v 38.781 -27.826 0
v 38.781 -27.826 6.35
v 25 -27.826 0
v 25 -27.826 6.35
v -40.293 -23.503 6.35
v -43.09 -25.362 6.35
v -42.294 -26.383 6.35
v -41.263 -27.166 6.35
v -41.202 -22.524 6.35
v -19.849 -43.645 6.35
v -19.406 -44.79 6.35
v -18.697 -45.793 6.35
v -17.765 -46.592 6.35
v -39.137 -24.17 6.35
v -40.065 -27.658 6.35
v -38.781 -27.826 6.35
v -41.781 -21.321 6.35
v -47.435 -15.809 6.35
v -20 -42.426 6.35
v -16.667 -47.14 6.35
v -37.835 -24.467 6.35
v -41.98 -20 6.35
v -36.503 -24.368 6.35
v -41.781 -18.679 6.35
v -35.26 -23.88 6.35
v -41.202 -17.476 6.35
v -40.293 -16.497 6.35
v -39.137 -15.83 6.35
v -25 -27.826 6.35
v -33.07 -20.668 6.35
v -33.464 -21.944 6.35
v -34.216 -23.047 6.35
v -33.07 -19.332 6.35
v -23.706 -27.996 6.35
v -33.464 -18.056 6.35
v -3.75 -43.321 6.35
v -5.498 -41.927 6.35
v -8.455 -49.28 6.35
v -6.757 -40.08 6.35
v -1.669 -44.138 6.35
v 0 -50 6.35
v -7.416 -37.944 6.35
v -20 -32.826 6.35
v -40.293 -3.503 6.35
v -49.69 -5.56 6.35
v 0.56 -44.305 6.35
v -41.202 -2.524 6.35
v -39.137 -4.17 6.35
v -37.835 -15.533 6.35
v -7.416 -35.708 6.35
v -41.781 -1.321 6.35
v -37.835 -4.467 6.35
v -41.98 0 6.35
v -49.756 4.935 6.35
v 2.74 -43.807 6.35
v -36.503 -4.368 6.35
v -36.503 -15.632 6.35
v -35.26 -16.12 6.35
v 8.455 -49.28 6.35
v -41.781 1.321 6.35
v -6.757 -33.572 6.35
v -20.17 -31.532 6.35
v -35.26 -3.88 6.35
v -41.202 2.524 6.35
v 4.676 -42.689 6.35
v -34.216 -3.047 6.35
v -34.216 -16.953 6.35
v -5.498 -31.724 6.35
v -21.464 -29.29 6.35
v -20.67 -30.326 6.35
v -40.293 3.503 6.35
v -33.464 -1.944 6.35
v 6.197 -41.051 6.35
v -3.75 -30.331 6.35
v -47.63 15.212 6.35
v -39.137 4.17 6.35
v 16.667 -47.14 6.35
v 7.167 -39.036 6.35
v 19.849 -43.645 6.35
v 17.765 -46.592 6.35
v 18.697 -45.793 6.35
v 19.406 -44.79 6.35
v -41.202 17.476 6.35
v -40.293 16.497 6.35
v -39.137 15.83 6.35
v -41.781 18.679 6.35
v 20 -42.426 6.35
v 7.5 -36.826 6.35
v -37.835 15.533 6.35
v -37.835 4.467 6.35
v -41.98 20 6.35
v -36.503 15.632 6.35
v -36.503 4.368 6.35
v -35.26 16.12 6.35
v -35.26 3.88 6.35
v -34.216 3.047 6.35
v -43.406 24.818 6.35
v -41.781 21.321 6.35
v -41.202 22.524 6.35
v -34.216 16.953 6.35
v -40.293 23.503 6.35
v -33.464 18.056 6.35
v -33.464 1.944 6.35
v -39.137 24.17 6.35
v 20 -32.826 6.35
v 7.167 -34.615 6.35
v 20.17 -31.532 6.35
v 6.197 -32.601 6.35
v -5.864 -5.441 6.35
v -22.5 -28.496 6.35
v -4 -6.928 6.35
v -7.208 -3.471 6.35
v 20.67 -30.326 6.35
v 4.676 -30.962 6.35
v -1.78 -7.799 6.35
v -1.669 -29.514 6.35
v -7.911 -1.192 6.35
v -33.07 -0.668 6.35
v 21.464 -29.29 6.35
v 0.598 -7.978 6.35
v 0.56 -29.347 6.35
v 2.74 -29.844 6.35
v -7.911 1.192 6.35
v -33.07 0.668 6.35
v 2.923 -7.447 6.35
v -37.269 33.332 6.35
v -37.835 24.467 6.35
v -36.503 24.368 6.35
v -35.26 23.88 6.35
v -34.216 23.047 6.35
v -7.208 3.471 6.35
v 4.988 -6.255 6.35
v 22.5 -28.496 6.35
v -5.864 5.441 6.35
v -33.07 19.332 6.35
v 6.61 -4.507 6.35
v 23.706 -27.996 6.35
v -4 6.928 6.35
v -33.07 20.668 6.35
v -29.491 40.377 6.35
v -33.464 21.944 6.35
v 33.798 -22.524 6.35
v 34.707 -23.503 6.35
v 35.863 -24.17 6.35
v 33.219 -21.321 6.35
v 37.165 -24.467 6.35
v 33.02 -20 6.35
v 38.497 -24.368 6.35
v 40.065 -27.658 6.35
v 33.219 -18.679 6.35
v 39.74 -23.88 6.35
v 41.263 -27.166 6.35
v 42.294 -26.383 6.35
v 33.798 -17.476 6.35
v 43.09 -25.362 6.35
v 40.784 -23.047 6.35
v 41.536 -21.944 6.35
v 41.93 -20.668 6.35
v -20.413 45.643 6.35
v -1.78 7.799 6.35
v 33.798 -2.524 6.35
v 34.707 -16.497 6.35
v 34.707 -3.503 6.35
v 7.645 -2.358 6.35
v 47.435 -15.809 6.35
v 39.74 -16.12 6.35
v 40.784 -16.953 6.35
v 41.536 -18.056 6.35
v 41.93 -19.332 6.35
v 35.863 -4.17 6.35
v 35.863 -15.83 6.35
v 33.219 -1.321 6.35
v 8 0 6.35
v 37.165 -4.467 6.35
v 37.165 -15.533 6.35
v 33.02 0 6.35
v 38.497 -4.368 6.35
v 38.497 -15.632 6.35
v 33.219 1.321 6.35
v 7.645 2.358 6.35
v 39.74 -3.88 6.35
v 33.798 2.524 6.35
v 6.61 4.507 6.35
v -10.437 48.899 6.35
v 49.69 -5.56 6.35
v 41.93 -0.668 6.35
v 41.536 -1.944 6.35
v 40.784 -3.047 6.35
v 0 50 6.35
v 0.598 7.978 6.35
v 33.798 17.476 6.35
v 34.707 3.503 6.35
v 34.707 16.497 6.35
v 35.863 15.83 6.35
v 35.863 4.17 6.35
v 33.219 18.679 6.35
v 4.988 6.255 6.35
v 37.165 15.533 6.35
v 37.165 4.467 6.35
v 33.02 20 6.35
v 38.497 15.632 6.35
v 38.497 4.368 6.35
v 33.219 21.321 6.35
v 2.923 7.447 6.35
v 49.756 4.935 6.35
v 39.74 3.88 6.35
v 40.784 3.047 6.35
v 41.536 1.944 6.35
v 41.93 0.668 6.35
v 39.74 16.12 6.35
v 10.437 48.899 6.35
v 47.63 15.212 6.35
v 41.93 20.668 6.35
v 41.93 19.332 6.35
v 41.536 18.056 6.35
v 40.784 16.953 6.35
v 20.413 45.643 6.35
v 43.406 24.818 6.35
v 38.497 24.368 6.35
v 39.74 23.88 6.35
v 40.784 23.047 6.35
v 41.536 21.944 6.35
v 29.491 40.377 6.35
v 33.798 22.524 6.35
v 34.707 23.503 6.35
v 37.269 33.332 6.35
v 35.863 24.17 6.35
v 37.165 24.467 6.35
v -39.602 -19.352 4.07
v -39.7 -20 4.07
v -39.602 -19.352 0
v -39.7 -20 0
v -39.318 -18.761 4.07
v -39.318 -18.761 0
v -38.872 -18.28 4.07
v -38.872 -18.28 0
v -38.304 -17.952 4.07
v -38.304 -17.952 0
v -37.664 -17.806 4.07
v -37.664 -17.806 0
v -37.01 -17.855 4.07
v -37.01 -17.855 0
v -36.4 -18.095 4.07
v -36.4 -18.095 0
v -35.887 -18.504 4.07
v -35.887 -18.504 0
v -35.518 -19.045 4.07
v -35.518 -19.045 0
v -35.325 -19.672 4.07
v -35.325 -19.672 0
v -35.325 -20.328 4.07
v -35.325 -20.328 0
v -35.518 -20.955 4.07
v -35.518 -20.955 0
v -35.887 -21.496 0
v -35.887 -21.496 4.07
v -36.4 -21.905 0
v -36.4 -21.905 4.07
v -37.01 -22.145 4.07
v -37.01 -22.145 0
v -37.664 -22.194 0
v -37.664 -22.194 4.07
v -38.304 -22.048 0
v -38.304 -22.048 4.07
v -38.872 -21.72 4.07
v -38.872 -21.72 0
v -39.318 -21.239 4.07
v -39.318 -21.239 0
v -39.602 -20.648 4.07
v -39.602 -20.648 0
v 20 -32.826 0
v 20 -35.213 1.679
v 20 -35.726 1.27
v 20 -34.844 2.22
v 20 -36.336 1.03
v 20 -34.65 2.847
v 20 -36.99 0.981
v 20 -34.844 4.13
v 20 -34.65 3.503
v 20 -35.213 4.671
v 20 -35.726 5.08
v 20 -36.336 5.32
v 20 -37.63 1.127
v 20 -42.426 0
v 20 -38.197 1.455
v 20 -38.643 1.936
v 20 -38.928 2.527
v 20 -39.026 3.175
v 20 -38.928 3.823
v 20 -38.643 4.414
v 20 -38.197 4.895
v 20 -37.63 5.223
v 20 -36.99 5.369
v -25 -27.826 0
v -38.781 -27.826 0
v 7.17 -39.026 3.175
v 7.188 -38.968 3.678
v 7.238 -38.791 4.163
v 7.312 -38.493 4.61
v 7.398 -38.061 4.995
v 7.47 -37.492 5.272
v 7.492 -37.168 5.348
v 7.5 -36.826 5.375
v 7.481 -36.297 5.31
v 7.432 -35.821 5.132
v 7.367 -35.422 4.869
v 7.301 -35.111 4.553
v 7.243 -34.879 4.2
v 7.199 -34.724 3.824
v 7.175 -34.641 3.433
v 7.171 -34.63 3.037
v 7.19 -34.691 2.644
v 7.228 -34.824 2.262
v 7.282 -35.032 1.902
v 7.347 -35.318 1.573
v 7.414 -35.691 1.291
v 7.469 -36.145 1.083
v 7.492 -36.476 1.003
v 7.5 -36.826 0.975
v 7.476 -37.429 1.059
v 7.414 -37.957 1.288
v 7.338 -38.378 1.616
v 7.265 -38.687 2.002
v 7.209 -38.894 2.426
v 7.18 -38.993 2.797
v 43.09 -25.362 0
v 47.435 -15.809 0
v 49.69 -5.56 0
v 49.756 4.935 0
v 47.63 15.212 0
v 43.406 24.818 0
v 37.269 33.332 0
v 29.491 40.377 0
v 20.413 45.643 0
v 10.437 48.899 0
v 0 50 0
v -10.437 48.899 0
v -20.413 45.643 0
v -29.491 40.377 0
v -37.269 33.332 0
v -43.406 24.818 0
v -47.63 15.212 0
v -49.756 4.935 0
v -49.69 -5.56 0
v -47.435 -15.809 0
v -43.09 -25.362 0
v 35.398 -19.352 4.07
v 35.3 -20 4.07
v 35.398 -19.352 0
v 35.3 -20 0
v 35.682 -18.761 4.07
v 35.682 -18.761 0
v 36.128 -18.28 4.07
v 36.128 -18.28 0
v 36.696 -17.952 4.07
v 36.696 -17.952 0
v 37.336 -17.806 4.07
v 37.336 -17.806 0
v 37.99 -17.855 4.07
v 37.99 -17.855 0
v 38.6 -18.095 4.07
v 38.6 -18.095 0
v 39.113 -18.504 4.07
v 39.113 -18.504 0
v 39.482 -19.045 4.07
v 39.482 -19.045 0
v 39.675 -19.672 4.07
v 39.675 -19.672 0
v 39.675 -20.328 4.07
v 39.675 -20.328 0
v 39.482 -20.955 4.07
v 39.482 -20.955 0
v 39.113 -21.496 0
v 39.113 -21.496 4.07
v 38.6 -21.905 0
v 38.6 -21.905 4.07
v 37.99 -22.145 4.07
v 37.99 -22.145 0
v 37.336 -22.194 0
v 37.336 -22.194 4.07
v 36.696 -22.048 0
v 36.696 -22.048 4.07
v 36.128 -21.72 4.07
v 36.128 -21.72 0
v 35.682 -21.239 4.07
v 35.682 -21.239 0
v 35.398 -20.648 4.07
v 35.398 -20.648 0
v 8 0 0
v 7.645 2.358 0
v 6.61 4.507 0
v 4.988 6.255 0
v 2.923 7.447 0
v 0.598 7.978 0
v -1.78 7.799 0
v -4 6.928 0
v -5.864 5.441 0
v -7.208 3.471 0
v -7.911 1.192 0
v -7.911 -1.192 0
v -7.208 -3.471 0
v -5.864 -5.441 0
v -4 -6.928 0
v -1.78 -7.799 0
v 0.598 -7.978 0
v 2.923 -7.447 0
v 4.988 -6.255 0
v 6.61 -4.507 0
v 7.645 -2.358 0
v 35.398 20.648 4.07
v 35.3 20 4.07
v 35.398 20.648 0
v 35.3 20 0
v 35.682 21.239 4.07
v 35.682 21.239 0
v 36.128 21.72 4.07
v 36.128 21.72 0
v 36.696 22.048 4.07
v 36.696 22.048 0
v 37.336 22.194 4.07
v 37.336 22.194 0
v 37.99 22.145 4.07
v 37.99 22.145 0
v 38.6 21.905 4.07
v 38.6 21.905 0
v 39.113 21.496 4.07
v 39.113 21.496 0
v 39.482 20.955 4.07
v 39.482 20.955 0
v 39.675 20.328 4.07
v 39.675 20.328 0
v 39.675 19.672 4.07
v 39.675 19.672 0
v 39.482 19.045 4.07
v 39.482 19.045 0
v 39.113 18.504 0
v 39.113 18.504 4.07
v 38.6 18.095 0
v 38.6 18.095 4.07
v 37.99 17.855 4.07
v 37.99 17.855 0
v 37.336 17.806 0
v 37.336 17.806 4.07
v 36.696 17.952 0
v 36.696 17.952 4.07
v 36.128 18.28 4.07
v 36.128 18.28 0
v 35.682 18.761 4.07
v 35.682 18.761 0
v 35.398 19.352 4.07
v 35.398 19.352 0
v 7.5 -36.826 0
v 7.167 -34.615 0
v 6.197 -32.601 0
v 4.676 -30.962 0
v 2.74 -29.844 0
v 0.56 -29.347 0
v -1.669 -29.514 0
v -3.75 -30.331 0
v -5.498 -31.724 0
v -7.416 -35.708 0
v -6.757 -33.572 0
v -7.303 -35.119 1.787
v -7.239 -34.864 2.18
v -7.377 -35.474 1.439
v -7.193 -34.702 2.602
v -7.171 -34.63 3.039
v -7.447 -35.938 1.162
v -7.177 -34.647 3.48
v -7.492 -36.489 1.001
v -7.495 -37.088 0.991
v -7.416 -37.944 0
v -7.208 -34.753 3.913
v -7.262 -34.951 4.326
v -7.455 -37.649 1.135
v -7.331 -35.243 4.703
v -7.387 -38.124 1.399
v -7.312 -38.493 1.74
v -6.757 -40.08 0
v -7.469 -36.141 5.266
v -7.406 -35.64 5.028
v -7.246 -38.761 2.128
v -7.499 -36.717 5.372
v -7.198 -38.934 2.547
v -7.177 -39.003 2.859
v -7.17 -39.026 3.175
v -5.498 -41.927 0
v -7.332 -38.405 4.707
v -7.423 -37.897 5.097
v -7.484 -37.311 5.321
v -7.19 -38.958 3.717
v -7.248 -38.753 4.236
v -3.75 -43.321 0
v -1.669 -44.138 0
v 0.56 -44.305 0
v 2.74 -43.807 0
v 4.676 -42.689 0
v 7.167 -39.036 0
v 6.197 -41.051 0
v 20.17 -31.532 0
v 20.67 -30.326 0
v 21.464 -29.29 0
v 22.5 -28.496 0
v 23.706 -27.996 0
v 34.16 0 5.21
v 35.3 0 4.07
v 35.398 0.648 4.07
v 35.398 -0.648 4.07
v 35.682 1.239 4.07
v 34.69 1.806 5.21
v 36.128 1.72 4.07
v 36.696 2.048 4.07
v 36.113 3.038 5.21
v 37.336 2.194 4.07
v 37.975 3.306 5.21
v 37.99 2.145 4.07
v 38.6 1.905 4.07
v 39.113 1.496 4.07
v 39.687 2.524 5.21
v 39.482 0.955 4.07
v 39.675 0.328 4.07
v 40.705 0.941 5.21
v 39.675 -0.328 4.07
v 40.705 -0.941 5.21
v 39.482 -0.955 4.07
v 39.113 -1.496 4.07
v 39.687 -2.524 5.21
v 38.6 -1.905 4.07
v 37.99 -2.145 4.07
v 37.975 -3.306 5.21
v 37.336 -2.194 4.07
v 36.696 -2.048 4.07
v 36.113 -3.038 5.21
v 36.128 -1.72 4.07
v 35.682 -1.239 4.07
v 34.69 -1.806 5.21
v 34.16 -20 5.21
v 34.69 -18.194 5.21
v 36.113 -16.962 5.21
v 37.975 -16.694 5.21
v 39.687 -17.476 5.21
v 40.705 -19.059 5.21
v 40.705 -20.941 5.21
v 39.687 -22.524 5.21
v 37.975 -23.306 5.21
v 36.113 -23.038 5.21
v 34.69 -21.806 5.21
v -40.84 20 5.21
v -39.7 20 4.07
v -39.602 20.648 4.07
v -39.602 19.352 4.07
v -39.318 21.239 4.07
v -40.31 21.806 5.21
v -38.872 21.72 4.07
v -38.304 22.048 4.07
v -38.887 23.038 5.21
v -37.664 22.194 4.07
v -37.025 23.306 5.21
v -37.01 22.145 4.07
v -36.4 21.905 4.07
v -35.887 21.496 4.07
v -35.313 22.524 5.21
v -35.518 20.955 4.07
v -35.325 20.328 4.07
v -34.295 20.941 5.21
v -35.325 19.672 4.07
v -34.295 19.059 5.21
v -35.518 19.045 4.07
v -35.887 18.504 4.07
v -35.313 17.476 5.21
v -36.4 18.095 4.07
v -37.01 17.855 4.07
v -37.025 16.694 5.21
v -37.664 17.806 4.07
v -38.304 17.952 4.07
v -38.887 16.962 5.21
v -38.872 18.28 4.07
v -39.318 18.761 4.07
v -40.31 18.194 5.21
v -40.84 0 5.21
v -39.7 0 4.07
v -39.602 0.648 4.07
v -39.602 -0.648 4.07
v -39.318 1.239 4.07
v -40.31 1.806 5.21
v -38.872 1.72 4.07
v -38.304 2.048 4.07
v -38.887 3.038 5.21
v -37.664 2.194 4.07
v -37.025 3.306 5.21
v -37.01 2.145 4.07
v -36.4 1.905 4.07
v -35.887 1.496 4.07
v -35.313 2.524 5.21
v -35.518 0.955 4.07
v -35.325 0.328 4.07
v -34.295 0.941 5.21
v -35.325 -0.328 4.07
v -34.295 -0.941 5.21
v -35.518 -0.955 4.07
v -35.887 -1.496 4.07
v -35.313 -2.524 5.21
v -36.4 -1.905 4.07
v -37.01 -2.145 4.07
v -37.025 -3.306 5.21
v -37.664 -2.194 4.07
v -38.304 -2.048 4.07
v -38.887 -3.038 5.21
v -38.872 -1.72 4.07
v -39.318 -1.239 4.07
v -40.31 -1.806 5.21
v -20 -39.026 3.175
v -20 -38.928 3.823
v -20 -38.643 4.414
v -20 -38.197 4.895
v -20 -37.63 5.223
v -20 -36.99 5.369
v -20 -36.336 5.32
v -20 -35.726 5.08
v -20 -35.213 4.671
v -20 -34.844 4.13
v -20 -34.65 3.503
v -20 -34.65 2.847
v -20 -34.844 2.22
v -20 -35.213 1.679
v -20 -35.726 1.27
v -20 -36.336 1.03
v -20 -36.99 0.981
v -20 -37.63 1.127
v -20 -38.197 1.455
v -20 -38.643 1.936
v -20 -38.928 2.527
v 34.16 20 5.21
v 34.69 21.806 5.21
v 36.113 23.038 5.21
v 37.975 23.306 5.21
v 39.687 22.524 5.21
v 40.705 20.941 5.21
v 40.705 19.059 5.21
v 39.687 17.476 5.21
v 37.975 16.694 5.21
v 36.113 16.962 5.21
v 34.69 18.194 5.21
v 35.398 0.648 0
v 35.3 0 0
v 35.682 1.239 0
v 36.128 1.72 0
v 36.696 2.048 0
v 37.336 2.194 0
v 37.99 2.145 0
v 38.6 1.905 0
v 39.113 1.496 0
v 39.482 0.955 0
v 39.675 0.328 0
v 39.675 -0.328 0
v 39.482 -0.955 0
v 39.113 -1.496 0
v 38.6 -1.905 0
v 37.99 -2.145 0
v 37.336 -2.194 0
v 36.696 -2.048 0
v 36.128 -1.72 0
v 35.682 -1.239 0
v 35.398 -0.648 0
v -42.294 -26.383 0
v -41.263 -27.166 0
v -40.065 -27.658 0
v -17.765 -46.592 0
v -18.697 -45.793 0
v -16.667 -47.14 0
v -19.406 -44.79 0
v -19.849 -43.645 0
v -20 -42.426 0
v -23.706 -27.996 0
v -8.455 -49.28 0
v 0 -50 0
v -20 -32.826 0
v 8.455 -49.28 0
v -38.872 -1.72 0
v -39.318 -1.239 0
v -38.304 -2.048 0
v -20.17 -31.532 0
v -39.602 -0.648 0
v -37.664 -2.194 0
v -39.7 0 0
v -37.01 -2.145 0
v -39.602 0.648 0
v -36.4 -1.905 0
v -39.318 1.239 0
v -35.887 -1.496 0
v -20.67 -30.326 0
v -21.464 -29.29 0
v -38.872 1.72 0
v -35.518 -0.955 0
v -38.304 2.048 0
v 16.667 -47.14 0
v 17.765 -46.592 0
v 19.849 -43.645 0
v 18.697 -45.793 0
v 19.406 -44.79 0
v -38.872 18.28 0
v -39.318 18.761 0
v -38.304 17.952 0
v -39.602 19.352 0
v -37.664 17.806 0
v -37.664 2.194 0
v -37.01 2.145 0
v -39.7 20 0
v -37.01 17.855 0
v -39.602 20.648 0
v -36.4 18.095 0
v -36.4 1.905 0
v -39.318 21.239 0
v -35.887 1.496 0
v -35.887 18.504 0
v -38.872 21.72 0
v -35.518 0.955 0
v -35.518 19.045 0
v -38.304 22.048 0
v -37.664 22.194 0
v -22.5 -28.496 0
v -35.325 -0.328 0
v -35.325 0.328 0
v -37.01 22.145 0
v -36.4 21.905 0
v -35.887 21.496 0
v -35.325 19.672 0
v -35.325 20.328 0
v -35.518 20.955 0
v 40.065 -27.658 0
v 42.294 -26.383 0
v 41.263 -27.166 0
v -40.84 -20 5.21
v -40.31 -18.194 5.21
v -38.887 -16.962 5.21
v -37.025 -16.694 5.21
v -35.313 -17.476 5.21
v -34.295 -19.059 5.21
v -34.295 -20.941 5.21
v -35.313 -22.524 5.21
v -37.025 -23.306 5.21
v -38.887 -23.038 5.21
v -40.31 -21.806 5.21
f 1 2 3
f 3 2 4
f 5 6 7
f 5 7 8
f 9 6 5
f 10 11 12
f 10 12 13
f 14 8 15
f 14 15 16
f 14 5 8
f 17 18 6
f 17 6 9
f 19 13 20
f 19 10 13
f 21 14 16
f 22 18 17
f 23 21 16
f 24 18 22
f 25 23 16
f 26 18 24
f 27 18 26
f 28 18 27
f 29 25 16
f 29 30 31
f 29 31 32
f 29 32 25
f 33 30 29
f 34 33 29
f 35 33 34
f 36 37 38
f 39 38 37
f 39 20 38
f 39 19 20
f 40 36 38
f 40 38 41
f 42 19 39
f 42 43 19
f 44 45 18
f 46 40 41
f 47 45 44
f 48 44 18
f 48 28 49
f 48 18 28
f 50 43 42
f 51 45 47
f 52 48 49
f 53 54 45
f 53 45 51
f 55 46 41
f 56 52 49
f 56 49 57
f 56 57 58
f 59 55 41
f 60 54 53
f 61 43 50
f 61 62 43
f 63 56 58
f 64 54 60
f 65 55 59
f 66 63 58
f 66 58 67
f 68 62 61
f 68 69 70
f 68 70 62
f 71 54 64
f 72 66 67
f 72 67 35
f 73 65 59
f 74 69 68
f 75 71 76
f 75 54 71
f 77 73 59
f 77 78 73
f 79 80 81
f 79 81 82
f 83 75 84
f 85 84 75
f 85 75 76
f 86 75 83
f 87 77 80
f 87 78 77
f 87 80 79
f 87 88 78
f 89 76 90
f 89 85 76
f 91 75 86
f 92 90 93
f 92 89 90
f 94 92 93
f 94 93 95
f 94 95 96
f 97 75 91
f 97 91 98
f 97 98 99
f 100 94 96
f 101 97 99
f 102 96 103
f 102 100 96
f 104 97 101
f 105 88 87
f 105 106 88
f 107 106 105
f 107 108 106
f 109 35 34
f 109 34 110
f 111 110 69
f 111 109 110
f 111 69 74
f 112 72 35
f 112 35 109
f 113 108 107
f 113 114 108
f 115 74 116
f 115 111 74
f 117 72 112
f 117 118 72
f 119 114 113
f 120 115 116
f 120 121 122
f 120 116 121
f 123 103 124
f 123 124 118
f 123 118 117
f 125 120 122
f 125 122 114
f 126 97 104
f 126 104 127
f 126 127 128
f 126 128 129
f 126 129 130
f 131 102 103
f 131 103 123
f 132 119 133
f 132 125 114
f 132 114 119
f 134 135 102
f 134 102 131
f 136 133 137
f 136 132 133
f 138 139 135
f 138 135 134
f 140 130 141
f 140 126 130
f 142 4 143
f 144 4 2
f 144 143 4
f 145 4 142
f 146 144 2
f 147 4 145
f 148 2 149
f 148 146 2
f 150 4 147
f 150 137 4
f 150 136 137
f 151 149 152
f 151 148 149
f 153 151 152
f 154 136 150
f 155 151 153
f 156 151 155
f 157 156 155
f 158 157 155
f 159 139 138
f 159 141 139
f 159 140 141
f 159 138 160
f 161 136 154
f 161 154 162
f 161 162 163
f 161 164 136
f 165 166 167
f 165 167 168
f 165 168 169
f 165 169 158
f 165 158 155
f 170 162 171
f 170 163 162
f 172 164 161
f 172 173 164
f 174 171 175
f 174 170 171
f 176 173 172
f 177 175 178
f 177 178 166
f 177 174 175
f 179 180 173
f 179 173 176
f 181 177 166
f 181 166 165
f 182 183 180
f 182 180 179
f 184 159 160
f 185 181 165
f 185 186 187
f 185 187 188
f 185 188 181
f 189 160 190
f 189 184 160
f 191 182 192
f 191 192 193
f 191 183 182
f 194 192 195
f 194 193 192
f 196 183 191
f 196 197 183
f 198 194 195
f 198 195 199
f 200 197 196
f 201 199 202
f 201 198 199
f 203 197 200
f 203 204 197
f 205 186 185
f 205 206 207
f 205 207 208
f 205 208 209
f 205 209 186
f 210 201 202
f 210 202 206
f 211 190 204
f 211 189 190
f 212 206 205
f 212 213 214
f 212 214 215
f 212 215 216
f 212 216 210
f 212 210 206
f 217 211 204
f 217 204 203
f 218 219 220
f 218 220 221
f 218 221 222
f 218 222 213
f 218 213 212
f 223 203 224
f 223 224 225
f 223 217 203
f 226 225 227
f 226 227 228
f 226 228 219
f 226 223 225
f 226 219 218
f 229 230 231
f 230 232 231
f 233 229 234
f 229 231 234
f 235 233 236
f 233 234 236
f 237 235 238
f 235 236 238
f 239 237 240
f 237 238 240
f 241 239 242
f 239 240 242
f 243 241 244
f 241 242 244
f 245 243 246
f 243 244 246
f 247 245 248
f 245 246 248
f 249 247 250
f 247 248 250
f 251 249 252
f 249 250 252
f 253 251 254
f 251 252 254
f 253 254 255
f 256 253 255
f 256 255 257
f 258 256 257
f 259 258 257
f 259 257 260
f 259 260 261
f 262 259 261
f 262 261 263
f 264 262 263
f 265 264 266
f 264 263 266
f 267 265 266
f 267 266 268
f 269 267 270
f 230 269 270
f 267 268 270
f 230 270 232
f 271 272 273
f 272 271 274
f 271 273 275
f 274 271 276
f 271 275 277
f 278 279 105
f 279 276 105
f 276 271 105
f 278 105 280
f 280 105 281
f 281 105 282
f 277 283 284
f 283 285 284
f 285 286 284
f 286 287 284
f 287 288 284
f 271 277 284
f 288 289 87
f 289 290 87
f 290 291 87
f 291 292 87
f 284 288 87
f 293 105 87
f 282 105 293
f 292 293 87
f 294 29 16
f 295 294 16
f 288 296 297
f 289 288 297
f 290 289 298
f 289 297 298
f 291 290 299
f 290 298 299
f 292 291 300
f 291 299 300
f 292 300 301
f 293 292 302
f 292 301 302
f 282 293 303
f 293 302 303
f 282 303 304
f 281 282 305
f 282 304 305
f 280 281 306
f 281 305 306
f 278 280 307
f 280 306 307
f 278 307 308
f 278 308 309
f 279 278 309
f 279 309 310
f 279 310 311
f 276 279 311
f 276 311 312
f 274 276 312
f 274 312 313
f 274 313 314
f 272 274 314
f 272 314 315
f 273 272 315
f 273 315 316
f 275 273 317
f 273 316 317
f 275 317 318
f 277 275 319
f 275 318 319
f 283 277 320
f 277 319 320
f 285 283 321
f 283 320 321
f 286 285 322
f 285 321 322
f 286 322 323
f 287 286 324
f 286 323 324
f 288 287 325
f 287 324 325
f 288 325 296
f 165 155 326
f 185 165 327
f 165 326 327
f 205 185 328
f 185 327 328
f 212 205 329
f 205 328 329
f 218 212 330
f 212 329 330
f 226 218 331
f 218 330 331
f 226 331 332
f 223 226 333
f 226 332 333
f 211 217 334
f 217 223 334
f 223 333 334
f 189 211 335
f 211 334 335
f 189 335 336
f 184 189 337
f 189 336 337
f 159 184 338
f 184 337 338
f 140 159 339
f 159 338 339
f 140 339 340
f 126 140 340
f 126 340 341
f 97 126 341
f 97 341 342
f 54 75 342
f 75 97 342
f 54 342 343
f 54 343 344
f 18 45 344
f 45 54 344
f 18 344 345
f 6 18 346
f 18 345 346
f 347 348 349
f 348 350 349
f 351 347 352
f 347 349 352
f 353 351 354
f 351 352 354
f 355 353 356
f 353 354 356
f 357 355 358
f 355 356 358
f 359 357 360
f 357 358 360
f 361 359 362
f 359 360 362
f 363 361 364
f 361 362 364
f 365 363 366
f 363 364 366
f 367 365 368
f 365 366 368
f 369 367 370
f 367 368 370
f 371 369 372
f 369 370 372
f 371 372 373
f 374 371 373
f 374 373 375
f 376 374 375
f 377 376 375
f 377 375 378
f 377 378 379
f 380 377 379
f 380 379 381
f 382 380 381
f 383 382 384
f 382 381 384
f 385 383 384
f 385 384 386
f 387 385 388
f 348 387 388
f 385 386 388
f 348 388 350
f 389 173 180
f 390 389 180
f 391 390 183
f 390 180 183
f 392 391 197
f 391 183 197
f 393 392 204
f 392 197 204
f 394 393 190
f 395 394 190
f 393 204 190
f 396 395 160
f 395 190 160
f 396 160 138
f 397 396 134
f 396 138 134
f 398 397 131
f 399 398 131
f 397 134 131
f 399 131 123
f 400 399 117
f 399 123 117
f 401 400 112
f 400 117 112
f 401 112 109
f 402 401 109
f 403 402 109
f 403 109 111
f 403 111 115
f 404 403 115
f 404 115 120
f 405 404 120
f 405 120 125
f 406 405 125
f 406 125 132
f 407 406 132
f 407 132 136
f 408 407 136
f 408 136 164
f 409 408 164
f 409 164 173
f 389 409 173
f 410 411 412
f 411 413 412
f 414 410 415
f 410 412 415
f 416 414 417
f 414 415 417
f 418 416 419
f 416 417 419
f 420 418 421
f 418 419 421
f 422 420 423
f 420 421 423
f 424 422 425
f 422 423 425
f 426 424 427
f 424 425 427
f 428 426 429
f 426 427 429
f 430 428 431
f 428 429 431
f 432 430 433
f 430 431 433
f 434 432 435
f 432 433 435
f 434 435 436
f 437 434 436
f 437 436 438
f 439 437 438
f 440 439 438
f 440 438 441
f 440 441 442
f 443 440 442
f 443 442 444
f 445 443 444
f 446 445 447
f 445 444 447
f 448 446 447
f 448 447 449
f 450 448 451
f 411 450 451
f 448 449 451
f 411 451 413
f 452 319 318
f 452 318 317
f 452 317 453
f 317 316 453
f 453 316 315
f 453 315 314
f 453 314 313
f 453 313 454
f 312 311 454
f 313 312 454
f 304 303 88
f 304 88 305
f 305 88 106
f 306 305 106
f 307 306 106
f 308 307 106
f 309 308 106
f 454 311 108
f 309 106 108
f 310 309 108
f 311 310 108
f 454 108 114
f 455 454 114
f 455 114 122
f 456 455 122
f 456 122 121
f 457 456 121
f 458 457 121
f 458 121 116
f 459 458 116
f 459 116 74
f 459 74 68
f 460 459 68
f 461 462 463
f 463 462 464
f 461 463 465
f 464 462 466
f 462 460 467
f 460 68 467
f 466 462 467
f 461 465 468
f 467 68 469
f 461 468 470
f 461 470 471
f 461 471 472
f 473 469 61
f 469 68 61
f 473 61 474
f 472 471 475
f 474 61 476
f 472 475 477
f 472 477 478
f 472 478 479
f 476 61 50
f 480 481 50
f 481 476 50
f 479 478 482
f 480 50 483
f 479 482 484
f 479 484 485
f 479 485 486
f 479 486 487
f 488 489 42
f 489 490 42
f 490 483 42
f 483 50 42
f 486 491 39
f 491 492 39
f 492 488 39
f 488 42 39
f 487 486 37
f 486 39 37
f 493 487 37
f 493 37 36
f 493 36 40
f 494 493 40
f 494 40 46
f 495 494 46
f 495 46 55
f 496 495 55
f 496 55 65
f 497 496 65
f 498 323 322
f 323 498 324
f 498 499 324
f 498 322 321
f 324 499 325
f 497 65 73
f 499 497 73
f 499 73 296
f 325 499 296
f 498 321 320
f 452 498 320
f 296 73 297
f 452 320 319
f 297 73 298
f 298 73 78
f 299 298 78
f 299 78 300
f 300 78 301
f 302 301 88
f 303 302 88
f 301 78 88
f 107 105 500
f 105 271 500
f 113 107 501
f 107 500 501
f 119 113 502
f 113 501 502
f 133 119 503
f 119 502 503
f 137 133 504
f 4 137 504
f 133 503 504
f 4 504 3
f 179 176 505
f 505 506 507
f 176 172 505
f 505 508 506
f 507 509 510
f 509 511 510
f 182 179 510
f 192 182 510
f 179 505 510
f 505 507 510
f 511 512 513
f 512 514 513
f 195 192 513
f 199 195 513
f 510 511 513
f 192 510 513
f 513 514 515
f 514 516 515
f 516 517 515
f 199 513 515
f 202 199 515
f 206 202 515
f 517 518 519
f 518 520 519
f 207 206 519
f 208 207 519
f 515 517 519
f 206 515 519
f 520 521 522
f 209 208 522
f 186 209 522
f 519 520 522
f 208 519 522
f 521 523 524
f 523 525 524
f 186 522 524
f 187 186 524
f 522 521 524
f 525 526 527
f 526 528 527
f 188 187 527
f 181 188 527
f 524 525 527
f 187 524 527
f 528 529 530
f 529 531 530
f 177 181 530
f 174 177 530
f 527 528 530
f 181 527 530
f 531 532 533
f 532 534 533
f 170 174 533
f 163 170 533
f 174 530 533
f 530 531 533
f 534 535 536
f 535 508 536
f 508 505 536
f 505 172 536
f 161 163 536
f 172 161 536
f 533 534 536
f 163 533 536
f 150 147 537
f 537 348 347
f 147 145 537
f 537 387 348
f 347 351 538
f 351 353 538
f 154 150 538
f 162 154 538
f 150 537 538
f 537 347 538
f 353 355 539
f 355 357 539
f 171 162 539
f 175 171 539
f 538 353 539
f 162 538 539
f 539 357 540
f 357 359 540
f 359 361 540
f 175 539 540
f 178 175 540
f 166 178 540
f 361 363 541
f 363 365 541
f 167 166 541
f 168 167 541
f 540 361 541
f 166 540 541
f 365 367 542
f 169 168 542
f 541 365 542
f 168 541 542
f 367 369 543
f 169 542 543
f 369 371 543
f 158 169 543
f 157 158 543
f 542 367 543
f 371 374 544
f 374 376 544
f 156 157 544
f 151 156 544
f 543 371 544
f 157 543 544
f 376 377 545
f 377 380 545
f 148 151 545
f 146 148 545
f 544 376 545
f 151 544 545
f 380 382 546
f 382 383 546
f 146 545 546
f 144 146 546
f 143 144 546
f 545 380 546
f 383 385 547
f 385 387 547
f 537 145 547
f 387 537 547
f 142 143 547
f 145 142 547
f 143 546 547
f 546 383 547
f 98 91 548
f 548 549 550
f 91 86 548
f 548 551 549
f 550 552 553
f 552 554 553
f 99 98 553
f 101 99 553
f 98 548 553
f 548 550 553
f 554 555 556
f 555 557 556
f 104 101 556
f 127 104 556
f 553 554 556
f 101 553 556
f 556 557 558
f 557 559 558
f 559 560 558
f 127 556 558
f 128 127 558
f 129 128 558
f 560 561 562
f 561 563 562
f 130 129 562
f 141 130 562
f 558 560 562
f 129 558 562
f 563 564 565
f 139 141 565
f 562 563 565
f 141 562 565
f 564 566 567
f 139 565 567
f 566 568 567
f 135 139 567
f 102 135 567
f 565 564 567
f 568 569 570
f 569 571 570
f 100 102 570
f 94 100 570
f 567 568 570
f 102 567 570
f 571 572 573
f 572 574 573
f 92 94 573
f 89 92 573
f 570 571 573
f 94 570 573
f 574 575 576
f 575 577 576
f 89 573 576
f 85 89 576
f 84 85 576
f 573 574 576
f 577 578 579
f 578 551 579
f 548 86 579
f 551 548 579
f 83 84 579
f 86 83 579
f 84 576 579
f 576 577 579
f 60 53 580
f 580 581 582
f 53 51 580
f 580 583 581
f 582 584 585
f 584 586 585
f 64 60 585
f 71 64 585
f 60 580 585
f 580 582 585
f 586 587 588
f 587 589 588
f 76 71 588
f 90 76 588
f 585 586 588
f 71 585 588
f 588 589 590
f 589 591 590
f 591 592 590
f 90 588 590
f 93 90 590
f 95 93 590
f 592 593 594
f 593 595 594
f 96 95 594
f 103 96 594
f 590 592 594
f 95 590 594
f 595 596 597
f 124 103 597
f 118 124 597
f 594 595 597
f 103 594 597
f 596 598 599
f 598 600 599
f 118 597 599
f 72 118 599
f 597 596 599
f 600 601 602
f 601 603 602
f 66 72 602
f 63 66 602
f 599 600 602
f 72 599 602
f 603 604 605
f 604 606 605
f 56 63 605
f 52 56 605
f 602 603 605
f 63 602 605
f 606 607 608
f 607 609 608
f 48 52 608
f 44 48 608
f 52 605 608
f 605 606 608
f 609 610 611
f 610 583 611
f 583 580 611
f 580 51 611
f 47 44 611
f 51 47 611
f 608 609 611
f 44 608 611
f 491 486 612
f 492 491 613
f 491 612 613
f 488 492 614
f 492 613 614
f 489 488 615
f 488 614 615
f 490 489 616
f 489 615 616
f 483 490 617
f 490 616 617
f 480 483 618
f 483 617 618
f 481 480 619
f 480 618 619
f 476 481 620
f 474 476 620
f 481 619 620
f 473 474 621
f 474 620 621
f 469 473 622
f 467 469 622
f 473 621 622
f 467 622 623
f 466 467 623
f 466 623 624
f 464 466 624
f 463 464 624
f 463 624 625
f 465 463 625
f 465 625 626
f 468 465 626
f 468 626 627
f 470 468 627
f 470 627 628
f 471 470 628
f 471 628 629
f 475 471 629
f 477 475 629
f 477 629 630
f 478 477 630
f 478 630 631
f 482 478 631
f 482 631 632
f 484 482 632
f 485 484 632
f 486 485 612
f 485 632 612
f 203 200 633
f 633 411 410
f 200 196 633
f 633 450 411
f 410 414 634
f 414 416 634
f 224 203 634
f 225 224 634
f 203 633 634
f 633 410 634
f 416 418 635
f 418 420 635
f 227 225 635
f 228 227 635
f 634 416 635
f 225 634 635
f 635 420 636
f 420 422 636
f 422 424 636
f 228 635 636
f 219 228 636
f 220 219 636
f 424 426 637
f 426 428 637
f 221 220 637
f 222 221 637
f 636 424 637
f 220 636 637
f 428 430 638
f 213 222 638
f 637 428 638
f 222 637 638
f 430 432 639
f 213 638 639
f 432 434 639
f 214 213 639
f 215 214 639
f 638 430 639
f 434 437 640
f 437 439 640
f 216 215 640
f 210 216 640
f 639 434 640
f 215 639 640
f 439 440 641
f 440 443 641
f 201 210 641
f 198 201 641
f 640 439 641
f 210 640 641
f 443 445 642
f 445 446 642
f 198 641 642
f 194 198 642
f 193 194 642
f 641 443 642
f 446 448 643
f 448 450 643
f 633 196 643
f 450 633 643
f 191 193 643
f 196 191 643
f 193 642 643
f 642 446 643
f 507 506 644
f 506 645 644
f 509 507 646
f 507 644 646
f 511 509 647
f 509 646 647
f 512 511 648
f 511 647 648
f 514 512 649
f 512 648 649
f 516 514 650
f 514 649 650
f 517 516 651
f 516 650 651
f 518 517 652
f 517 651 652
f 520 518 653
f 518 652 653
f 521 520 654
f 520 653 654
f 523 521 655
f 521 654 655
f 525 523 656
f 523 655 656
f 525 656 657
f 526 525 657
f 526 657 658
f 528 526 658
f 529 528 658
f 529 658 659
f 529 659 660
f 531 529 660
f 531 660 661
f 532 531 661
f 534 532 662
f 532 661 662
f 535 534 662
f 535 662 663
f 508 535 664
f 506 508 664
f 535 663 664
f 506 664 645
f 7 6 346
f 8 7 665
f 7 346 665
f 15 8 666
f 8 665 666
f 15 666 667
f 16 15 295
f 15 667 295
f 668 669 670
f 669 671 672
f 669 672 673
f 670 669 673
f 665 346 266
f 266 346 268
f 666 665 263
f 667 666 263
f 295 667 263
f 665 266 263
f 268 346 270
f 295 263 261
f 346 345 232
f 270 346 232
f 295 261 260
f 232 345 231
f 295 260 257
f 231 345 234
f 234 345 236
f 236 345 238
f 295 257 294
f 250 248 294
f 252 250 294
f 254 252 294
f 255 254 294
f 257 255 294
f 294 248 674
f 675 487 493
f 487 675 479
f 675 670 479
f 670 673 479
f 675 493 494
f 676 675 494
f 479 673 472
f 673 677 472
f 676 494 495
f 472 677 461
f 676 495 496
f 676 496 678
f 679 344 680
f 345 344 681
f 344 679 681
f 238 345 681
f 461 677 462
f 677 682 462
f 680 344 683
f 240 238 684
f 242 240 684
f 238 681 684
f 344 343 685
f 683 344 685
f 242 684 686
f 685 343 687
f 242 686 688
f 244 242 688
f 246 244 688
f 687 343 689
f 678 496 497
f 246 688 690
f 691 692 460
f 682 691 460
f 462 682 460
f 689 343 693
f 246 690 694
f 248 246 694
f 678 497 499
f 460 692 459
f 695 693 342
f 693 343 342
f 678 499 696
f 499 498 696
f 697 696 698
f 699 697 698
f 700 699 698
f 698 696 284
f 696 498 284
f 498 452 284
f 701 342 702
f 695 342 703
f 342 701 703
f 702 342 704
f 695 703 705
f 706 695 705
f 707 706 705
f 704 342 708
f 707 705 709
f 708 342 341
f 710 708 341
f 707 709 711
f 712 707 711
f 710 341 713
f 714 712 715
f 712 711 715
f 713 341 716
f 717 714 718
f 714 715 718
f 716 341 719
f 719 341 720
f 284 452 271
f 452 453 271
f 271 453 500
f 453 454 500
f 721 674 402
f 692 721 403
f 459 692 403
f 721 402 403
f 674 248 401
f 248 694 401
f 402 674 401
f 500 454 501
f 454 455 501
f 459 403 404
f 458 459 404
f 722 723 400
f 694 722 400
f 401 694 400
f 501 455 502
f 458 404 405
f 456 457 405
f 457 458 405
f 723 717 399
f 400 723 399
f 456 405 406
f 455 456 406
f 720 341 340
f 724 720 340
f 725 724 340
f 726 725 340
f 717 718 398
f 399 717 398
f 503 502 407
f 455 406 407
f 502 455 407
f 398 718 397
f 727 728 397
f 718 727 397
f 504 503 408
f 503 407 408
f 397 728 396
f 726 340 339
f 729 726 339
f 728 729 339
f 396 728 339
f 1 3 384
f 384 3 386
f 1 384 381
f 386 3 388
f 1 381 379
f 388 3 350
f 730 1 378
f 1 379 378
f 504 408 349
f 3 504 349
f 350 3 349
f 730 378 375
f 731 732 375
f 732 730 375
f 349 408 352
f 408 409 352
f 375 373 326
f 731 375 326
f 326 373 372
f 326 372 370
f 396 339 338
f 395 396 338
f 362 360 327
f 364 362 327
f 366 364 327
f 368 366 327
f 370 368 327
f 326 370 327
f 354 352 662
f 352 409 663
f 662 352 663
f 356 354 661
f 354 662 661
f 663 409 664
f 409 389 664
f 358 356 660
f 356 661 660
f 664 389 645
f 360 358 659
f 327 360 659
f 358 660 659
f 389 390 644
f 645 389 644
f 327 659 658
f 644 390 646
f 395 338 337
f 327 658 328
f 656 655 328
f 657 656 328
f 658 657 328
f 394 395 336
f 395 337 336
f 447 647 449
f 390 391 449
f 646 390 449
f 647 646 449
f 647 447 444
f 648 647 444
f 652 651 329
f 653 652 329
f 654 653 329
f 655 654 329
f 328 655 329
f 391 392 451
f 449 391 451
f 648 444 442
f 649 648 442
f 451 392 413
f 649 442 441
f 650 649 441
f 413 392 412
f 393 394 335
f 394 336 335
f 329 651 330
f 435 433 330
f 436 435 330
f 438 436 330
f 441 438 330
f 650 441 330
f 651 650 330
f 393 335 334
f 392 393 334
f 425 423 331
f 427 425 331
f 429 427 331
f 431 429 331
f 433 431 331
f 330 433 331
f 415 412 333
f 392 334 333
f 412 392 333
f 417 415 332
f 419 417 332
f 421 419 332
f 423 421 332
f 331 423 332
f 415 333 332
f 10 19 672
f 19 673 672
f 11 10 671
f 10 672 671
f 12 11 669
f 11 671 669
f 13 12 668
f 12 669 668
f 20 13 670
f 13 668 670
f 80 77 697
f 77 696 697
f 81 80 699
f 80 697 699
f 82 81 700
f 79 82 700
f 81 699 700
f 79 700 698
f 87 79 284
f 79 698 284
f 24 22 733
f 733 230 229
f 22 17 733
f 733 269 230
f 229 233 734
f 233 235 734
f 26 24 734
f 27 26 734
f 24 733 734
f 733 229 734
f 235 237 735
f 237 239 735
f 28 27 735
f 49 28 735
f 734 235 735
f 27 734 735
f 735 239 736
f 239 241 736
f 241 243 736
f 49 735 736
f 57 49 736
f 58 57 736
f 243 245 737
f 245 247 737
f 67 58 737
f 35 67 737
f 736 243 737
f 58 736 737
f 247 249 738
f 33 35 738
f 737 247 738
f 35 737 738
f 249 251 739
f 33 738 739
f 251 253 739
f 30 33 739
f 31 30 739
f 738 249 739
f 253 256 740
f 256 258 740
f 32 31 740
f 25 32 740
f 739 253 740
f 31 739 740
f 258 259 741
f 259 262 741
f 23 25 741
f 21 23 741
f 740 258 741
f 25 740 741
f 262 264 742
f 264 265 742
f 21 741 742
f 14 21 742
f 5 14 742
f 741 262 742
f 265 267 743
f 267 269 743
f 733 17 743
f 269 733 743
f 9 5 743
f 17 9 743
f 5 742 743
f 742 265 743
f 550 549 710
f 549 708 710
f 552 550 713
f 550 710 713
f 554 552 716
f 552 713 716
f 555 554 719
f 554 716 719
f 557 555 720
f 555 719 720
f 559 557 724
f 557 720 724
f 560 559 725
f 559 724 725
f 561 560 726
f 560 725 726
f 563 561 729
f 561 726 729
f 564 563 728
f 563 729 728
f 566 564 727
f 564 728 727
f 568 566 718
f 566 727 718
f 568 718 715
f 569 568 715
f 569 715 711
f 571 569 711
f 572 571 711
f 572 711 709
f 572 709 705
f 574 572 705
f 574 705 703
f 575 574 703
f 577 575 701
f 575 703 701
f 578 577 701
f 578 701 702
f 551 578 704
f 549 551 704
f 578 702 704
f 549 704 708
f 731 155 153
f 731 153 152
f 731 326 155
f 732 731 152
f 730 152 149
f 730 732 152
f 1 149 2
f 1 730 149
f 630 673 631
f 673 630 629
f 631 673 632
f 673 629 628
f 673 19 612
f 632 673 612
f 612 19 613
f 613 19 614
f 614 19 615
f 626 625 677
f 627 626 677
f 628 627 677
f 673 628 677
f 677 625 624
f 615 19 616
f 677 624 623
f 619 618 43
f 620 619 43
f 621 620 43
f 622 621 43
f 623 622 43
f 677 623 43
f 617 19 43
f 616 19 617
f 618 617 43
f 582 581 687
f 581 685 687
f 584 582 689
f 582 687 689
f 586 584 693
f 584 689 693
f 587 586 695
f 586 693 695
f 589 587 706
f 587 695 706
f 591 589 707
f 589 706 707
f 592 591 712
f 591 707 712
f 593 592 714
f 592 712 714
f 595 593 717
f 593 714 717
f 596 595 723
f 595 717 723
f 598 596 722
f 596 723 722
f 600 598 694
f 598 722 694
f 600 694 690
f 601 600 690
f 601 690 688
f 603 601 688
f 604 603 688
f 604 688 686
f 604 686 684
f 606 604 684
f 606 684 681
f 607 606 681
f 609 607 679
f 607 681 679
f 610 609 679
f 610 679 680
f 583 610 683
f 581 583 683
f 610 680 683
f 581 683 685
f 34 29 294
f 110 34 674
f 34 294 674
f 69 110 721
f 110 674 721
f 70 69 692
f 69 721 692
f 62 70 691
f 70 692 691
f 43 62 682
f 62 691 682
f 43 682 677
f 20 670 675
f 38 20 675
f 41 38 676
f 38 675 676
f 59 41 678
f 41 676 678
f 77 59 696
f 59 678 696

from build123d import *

# Parameters (mm, degrees)
F0_R           = 50
F1_DEPTH       = 6.35
F3_D           = 4.4
F3_CSINK_D     = 8.96
F3_CSINK_ANGLE = 90
F4_R           = 8
F5_DEPTH       = 8
F7_DEPTH       = 25
F9_R           = 5
F10_D          = 4.4
F11_R          = 7.5
F12_DEPTH      = 25


# Not quite as in the source:
# - a feature names something its author has since deleted; it is built from what else it names


with BuildPart() as f1:
    # F0 (on Top) → F1 (new body)
    with BuildSketch(Plane.XY):
        Circle(F0_R)
    extrude(amount=F1_DEPTH)

    # F3 (through all)
    with Locations(Plane.XY.offset(6.35)):
        with Locations((-37.5, 20), (-37.5, 0), (-37.5, -20), (37.5, 20), (37.5, 0), (37.5, -20)):
            CounterSinkHole(F3_D / 2, F3_CSINK_D / 2, counter_sink_angle=F3_CSINK_ANGLE)

    # F4 (on face) → F5 (cut)
    with BuildSketch(Plane.XY.offset(6.35)):
        Circle(F4_R)
    extrude(amount=-F5_DEPTH, mode=Mode.SUBTRACT)

    # F6 (on face) → F7 (cut)
    with BuildSketch(Plane.XY.offset(6.35)):
        with BuildLine():
            Line((-20, -27.8257569496), (-41.5418734554, -27.8257569496))
            ThreePointArc((-41.5418734554, -27.8257569496), (-32.0601083451, -38.3685998298), (-20, -45.8257569496))
            Line((-20, -45.8257569496), (-20, -27.8257569496))
        make_face()
        with BuildLine():
            ThreePointArc((20, -45.8257569496), (32.0601083451, -38.3685998298), (41.5418734554, -27.8257569496))
            Line((41.5418734554, -27.8257569496), (20, -27.8257569496))
            Line((20, -27.8257569496), (20, -45.8257569496))
        make_face()
    extrude(amount=-F7_DEPTH, mode=Mode.SUBTRACT)

    # F9
    f9_edges = [f1.edges().sort_by_distance(p)[0] for p in [
        (-41.541873, -27.825757, 3.175),
        (-20, -45.825757, 3.175),
        (-20, -27.825757, 3.175),
        (20, -27.825757, 3.175),
        (20, -45.825757, 3.175),
        (41.541873, -27.825757, 3.175),
    ]]
    fillet(f9_edges, radius=F9_R)

    # F10 (through all)
    with Locations(Plane.YZ.offset(20)):
        with Locations((-36.8257569496, 3.175)):
            Hole(F10_D / 2)

    # F11 (on face) → F12 (cut)
    with BuildSketch(Plane.XY.offset(6.35)):
        with Locations((0, -36.8257569496)):
            Circle(F11_R)
    extrude(amount=-F12_DEPTH, mode=Mode.SUBTRACT)


solid = f1.part
